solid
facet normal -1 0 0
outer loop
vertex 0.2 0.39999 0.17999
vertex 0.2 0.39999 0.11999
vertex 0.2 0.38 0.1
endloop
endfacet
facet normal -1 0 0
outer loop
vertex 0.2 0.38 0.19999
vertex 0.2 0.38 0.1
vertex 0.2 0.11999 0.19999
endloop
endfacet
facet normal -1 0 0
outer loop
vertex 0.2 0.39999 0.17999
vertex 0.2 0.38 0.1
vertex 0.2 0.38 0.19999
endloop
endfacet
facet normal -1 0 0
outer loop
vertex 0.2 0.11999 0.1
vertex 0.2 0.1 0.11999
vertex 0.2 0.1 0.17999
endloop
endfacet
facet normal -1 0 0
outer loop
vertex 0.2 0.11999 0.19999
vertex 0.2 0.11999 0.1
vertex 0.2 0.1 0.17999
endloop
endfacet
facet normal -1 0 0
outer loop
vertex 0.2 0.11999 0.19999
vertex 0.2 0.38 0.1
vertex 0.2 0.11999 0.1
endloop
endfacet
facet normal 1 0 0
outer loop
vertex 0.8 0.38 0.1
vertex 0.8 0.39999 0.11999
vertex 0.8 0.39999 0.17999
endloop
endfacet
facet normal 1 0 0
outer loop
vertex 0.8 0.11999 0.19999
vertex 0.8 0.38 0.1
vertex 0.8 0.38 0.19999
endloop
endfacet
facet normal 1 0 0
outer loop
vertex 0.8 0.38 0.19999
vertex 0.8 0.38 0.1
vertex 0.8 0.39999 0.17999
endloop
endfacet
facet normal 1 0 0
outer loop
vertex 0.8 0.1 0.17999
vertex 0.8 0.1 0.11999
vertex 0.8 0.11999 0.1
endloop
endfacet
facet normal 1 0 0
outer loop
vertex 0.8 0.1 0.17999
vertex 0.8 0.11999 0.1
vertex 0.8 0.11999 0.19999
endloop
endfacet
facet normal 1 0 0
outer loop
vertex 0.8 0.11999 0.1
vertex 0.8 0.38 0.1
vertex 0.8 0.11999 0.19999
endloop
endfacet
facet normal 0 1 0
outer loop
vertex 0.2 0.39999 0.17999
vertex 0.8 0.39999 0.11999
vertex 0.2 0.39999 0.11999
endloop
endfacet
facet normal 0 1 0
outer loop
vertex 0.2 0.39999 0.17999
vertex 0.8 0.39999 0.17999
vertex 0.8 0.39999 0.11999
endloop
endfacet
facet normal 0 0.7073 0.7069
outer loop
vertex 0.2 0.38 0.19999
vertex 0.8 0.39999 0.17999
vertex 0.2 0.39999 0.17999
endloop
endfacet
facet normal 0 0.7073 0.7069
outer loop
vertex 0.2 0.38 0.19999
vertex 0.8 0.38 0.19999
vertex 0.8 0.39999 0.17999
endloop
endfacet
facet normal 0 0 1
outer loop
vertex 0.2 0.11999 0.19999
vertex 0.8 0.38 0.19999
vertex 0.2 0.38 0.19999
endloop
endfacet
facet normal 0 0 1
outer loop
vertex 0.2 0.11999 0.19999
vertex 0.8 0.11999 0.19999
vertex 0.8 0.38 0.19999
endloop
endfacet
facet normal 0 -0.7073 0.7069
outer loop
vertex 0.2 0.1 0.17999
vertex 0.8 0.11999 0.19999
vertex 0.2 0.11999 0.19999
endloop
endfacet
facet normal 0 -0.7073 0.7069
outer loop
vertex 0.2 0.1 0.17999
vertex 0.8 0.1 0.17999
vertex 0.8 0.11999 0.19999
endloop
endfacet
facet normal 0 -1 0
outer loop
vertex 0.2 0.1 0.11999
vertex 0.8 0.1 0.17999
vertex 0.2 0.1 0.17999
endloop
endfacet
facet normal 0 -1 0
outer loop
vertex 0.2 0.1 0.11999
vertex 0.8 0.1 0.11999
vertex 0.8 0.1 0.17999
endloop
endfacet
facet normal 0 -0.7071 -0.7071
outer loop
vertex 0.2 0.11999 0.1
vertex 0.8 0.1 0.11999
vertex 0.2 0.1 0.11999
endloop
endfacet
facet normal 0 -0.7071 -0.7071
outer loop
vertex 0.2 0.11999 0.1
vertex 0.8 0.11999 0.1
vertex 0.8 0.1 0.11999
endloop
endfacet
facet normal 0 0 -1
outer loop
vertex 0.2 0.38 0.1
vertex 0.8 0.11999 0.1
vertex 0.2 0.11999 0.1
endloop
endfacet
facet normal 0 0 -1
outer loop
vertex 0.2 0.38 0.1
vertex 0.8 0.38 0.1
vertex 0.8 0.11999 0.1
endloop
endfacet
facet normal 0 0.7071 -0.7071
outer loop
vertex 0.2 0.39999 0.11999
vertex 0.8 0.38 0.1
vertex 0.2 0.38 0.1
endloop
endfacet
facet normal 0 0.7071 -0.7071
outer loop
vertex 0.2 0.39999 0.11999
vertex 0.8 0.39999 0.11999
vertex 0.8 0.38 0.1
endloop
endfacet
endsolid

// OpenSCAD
translate([0.2, 0.1, 0.1])
rotate([90,0,90])
        linear_extrude(.6, false, convexity=1, twist=0, slices=1) {
polygon([[0, 0.02], [0.02, 0], [0.28, 0], [0.3, 0.02],
[0.3, 0.08], [0.28, 0.1], [0.02, 0.1], [0, 0.08]]);
        }
